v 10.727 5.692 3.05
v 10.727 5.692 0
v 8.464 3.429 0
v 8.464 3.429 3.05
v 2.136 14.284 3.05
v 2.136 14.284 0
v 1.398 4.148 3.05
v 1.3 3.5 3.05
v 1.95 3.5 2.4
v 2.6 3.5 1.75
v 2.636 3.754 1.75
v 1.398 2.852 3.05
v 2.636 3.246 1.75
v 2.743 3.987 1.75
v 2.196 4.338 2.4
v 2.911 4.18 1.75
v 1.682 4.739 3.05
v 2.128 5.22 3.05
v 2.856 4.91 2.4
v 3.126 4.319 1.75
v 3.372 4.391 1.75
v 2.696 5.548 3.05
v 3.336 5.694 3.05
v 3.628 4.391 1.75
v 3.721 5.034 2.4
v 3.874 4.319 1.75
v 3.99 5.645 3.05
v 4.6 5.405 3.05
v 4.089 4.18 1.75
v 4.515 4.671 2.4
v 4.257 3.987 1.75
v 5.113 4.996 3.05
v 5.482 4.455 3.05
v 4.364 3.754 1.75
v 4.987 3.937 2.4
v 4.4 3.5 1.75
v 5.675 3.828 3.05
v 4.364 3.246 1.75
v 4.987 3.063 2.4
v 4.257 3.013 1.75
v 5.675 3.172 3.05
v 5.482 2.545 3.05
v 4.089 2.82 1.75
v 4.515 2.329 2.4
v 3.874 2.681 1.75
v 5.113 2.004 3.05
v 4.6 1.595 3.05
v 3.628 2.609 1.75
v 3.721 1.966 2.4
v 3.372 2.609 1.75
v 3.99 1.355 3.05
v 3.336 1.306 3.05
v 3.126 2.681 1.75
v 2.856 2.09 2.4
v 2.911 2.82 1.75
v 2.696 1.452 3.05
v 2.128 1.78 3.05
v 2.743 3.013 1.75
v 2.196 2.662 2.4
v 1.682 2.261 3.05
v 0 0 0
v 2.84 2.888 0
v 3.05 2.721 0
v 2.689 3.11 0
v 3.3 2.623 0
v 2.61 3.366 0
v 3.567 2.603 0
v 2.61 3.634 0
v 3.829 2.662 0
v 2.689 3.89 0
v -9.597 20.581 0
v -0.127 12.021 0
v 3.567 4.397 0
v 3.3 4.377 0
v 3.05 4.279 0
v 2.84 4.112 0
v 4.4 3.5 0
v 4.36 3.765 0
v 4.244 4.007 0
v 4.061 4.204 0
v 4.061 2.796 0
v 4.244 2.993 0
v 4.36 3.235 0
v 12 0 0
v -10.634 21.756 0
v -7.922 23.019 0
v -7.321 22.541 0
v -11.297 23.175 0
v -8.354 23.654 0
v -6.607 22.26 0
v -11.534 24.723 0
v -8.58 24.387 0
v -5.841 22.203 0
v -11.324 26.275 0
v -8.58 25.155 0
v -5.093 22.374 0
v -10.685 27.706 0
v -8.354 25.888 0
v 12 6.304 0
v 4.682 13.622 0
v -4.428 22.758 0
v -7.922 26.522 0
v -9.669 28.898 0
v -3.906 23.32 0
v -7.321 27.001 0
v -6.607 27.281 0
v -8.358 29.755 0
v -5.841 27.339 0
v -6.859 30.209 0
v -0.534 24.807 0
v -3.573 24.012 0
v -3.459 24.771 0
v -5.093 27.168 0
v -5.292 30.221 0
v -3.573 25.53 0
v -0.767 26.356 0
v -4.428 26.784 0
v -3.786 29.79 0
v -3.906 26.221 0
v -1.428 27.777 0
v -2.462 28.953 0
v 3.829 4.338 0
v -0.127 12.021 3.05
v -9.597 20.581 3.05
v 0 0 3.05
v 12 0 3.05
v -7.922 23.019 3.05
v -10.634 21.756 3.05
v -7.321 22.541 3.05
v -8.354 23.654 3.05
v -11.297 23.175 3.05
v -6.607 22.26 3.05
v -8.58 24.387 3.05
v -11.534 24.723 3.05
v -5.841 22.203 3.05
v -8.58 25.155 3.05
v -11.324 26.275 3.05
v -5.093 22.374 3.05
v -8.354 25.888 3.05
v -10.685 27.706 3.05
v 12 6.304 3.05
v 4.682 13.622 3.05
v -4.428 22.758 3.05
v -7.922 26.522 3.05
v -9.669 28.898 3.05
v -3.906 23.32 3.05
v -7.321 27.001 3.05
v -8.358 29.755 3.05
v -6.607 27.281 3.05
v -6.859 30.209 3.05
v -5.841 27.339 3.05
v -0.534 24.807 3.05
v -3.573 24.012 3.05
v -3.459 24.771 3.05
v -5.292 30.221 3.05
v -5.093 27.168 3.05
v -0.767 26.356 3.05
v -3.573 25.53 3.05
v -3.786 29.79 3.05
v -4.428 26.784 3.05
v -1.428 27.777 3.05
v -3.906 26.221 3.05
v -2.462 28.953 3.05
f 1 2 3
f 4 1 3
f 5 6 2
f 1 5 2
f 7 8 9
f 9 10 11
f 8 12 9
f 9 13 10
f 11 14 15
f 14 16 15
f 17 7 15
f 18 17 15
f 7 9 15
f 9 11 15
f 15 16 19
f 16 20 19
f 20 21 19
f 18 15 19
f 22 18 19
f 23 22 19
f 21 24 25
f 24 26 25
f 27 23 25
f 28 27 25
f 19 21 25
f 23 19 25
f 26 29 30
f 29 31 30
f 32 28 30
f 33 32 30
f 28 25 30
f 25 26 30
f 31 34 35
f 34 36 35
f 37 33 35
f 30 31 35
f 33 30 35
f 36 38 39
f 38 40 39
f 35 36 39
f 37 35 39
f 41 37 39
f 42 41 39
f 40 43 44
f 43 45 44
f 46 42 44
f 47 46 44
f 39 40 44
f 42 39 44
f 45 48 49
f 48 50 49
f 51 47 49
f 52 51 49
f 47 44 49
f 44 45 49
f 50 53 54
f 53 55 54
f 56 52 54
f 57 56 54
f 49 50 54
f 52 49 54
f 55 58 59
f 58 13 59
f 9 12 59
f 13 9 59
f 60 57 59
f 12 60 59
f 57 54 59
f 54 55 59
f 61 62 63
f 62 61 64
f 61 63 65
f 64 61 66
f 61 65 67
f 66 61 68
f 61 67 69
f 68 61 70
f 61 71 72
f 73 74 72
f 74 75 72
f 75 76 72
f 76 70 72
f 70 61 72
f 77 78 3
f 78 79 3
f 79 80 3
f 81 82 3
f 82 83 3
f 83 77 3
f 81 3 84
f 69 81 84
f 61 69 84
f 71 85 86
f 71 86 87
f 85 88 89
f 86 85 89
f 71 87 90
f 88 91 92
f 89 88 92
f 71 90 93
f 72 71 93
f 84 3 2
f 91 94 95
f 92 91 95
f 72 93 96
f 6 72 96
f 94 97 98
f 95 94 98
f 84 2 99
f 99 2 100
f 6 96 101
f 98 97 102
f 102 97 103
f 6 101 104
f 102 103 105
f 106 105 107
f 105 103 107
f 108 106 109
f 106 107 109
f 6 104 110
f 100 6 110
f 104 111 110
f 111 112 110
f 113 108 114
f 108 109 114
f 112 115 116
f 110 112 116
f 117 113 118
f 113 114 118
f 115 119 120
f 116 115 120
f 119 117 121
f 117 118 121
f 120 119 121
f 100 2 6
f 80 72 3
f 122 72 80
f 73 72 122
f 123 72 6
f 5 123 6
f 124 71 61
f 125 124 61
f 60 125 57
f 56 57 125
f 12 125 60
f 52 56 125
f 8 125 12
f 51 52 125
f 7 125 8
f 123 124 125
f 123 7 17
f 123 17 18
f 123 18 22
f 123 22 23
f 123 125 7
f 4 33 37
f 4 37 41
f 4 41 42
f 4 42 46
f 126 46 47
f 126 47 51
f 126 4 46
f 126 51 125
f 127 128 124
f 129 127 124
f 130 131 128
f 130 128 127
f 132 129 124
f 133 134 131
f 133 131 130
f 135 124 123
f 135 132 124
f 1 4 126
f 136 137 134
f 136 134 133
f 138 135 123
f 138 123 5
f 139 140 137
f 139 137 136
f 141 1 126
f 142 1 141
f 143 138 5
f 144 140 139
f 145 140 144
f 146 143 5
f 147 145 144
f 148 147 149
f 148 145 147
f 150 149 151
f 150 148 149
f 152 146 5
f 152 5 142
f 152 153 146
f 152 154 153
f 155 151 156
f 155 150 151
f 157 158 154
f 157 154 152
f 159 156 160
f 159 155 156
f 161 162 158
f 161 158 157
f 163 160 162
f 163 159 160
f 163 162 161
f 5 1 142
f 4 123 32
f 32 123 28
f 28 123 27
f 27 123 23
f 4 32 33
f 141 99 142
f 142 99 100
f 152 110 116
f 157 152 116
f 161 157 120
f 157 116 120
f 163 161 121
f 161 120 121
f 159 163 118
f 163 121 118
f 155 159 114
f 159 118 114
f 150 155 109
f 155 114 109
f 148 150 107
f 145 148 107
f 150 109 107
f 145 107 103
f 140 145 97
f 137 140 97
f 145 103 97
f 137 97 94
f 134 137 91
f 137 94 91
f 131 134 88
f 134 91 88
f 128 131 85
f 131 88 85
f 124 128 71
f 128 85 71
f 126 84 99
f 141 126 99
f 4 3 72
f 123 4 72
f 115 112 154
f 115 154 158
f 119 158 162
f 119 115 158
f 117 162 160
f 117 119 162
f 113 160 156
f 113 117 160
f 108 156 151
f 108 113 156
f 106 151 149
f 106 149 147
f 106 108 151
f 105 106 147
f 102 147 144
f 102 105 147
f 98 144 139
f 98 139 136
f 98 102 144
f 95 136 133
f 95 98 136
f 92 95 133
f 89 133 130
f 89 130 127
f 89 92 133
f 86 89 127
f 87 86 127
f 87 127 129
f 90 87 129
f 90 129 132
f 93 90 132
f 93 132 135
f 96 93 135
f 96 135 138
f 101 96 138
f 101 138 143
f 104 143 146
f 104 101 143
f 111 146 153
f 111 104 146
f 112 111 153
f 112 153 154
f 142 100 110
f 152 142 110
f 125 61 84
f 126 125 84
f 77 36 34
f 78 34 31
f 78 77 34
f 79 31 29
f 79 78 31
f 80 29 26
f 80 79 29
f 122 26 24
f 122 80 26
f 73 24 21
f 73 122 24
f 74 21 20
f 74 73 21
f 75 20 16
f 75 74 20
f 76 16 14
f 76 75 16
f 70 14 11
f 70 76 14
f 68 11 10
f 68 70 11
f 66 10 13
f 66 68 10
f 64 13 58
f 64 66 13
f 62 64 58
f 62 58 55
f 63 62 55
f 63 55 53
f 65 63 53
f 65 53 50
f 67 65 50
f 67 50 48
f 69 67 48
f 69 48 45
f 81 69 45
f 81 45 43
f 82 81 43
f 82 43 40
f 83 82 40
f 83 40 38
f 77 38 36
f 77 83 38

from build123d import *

# Parameters (mm, degrees)
SKETCH1_R                                       = 0.9
SKETCH1_R_2                                     = 2.575
BOSS_EXTRUDE1_DEPTH                             = 3.05
CSK_FOR_M2_FLAT_HEAD_MACHINE_SCREW1_D           = 1.8
CSK_FOR_M2_FLAT_HEAD_MACHINE_SCREW1_CSINK_D     = 4.4
CSK_FOR_M2_FLAT_HEAD_MACHINE_SCREW1_CSINK_ANGLE = 90


with BuildPart() as part:
    # Sketch1 → Boss-Extrude1 (new body)
    with BuildSketch(Plane.XY):
        with BuildLine():
            Line((12, 0), (12, 6.303908615))
            Line((12, 6.303908615), (4.681585686, 13.62232293))
            Line((4.681585686, 13.62232293), (-0.534038586, 24.807265275))
            ThreePointArc((-0.534038586, 24.807265275), (-8.358318048, 29.755478813), (-9.597116456, 20.581082657))
            Line((-9.597116456, 20.581082657), (0, 0))
            Line((0, 0), (12, 0))
        make_face()
        Polygon((10.727207794, 5.692209589), (8.464466094, 3.429467889), (-0.126881297, 12.02081528), (2.135860402, 14.28355698), align=None, mode=Mode.SUBTRACT)
        with Locations((3.5, 3.5)):
            Circle(SKETCH1_R, mode=Mode.SUBTRACT)
        with Locations((-6.033917608, 24.770785985)):
            Circle(SKETCH1_R_2, mode=Mode.SUBTRACT)
    extrude(amount=BOSS_EXTRUDE1_DEPTH)

    # CSK for M2 Flat Head Machine Screw1 (through all)
    with Locations(Plane.XY.offset(3.05)):
        with Locations((3.5, 3.5)):
            CounterSinkHole(CSK_FOR_M2_FLAT_HEAD_MACHINE_SCREW1_D / 2, CSK_FOR_M2_FLAT_HEAD_MACHINE_SCREW1_CSINK_D / 2, counter_sink_angle=CSK_FOR_M2_FLAT_HEAD_MACHINE_SCREW1_CSINK_ANGLE)


solid = part.part
